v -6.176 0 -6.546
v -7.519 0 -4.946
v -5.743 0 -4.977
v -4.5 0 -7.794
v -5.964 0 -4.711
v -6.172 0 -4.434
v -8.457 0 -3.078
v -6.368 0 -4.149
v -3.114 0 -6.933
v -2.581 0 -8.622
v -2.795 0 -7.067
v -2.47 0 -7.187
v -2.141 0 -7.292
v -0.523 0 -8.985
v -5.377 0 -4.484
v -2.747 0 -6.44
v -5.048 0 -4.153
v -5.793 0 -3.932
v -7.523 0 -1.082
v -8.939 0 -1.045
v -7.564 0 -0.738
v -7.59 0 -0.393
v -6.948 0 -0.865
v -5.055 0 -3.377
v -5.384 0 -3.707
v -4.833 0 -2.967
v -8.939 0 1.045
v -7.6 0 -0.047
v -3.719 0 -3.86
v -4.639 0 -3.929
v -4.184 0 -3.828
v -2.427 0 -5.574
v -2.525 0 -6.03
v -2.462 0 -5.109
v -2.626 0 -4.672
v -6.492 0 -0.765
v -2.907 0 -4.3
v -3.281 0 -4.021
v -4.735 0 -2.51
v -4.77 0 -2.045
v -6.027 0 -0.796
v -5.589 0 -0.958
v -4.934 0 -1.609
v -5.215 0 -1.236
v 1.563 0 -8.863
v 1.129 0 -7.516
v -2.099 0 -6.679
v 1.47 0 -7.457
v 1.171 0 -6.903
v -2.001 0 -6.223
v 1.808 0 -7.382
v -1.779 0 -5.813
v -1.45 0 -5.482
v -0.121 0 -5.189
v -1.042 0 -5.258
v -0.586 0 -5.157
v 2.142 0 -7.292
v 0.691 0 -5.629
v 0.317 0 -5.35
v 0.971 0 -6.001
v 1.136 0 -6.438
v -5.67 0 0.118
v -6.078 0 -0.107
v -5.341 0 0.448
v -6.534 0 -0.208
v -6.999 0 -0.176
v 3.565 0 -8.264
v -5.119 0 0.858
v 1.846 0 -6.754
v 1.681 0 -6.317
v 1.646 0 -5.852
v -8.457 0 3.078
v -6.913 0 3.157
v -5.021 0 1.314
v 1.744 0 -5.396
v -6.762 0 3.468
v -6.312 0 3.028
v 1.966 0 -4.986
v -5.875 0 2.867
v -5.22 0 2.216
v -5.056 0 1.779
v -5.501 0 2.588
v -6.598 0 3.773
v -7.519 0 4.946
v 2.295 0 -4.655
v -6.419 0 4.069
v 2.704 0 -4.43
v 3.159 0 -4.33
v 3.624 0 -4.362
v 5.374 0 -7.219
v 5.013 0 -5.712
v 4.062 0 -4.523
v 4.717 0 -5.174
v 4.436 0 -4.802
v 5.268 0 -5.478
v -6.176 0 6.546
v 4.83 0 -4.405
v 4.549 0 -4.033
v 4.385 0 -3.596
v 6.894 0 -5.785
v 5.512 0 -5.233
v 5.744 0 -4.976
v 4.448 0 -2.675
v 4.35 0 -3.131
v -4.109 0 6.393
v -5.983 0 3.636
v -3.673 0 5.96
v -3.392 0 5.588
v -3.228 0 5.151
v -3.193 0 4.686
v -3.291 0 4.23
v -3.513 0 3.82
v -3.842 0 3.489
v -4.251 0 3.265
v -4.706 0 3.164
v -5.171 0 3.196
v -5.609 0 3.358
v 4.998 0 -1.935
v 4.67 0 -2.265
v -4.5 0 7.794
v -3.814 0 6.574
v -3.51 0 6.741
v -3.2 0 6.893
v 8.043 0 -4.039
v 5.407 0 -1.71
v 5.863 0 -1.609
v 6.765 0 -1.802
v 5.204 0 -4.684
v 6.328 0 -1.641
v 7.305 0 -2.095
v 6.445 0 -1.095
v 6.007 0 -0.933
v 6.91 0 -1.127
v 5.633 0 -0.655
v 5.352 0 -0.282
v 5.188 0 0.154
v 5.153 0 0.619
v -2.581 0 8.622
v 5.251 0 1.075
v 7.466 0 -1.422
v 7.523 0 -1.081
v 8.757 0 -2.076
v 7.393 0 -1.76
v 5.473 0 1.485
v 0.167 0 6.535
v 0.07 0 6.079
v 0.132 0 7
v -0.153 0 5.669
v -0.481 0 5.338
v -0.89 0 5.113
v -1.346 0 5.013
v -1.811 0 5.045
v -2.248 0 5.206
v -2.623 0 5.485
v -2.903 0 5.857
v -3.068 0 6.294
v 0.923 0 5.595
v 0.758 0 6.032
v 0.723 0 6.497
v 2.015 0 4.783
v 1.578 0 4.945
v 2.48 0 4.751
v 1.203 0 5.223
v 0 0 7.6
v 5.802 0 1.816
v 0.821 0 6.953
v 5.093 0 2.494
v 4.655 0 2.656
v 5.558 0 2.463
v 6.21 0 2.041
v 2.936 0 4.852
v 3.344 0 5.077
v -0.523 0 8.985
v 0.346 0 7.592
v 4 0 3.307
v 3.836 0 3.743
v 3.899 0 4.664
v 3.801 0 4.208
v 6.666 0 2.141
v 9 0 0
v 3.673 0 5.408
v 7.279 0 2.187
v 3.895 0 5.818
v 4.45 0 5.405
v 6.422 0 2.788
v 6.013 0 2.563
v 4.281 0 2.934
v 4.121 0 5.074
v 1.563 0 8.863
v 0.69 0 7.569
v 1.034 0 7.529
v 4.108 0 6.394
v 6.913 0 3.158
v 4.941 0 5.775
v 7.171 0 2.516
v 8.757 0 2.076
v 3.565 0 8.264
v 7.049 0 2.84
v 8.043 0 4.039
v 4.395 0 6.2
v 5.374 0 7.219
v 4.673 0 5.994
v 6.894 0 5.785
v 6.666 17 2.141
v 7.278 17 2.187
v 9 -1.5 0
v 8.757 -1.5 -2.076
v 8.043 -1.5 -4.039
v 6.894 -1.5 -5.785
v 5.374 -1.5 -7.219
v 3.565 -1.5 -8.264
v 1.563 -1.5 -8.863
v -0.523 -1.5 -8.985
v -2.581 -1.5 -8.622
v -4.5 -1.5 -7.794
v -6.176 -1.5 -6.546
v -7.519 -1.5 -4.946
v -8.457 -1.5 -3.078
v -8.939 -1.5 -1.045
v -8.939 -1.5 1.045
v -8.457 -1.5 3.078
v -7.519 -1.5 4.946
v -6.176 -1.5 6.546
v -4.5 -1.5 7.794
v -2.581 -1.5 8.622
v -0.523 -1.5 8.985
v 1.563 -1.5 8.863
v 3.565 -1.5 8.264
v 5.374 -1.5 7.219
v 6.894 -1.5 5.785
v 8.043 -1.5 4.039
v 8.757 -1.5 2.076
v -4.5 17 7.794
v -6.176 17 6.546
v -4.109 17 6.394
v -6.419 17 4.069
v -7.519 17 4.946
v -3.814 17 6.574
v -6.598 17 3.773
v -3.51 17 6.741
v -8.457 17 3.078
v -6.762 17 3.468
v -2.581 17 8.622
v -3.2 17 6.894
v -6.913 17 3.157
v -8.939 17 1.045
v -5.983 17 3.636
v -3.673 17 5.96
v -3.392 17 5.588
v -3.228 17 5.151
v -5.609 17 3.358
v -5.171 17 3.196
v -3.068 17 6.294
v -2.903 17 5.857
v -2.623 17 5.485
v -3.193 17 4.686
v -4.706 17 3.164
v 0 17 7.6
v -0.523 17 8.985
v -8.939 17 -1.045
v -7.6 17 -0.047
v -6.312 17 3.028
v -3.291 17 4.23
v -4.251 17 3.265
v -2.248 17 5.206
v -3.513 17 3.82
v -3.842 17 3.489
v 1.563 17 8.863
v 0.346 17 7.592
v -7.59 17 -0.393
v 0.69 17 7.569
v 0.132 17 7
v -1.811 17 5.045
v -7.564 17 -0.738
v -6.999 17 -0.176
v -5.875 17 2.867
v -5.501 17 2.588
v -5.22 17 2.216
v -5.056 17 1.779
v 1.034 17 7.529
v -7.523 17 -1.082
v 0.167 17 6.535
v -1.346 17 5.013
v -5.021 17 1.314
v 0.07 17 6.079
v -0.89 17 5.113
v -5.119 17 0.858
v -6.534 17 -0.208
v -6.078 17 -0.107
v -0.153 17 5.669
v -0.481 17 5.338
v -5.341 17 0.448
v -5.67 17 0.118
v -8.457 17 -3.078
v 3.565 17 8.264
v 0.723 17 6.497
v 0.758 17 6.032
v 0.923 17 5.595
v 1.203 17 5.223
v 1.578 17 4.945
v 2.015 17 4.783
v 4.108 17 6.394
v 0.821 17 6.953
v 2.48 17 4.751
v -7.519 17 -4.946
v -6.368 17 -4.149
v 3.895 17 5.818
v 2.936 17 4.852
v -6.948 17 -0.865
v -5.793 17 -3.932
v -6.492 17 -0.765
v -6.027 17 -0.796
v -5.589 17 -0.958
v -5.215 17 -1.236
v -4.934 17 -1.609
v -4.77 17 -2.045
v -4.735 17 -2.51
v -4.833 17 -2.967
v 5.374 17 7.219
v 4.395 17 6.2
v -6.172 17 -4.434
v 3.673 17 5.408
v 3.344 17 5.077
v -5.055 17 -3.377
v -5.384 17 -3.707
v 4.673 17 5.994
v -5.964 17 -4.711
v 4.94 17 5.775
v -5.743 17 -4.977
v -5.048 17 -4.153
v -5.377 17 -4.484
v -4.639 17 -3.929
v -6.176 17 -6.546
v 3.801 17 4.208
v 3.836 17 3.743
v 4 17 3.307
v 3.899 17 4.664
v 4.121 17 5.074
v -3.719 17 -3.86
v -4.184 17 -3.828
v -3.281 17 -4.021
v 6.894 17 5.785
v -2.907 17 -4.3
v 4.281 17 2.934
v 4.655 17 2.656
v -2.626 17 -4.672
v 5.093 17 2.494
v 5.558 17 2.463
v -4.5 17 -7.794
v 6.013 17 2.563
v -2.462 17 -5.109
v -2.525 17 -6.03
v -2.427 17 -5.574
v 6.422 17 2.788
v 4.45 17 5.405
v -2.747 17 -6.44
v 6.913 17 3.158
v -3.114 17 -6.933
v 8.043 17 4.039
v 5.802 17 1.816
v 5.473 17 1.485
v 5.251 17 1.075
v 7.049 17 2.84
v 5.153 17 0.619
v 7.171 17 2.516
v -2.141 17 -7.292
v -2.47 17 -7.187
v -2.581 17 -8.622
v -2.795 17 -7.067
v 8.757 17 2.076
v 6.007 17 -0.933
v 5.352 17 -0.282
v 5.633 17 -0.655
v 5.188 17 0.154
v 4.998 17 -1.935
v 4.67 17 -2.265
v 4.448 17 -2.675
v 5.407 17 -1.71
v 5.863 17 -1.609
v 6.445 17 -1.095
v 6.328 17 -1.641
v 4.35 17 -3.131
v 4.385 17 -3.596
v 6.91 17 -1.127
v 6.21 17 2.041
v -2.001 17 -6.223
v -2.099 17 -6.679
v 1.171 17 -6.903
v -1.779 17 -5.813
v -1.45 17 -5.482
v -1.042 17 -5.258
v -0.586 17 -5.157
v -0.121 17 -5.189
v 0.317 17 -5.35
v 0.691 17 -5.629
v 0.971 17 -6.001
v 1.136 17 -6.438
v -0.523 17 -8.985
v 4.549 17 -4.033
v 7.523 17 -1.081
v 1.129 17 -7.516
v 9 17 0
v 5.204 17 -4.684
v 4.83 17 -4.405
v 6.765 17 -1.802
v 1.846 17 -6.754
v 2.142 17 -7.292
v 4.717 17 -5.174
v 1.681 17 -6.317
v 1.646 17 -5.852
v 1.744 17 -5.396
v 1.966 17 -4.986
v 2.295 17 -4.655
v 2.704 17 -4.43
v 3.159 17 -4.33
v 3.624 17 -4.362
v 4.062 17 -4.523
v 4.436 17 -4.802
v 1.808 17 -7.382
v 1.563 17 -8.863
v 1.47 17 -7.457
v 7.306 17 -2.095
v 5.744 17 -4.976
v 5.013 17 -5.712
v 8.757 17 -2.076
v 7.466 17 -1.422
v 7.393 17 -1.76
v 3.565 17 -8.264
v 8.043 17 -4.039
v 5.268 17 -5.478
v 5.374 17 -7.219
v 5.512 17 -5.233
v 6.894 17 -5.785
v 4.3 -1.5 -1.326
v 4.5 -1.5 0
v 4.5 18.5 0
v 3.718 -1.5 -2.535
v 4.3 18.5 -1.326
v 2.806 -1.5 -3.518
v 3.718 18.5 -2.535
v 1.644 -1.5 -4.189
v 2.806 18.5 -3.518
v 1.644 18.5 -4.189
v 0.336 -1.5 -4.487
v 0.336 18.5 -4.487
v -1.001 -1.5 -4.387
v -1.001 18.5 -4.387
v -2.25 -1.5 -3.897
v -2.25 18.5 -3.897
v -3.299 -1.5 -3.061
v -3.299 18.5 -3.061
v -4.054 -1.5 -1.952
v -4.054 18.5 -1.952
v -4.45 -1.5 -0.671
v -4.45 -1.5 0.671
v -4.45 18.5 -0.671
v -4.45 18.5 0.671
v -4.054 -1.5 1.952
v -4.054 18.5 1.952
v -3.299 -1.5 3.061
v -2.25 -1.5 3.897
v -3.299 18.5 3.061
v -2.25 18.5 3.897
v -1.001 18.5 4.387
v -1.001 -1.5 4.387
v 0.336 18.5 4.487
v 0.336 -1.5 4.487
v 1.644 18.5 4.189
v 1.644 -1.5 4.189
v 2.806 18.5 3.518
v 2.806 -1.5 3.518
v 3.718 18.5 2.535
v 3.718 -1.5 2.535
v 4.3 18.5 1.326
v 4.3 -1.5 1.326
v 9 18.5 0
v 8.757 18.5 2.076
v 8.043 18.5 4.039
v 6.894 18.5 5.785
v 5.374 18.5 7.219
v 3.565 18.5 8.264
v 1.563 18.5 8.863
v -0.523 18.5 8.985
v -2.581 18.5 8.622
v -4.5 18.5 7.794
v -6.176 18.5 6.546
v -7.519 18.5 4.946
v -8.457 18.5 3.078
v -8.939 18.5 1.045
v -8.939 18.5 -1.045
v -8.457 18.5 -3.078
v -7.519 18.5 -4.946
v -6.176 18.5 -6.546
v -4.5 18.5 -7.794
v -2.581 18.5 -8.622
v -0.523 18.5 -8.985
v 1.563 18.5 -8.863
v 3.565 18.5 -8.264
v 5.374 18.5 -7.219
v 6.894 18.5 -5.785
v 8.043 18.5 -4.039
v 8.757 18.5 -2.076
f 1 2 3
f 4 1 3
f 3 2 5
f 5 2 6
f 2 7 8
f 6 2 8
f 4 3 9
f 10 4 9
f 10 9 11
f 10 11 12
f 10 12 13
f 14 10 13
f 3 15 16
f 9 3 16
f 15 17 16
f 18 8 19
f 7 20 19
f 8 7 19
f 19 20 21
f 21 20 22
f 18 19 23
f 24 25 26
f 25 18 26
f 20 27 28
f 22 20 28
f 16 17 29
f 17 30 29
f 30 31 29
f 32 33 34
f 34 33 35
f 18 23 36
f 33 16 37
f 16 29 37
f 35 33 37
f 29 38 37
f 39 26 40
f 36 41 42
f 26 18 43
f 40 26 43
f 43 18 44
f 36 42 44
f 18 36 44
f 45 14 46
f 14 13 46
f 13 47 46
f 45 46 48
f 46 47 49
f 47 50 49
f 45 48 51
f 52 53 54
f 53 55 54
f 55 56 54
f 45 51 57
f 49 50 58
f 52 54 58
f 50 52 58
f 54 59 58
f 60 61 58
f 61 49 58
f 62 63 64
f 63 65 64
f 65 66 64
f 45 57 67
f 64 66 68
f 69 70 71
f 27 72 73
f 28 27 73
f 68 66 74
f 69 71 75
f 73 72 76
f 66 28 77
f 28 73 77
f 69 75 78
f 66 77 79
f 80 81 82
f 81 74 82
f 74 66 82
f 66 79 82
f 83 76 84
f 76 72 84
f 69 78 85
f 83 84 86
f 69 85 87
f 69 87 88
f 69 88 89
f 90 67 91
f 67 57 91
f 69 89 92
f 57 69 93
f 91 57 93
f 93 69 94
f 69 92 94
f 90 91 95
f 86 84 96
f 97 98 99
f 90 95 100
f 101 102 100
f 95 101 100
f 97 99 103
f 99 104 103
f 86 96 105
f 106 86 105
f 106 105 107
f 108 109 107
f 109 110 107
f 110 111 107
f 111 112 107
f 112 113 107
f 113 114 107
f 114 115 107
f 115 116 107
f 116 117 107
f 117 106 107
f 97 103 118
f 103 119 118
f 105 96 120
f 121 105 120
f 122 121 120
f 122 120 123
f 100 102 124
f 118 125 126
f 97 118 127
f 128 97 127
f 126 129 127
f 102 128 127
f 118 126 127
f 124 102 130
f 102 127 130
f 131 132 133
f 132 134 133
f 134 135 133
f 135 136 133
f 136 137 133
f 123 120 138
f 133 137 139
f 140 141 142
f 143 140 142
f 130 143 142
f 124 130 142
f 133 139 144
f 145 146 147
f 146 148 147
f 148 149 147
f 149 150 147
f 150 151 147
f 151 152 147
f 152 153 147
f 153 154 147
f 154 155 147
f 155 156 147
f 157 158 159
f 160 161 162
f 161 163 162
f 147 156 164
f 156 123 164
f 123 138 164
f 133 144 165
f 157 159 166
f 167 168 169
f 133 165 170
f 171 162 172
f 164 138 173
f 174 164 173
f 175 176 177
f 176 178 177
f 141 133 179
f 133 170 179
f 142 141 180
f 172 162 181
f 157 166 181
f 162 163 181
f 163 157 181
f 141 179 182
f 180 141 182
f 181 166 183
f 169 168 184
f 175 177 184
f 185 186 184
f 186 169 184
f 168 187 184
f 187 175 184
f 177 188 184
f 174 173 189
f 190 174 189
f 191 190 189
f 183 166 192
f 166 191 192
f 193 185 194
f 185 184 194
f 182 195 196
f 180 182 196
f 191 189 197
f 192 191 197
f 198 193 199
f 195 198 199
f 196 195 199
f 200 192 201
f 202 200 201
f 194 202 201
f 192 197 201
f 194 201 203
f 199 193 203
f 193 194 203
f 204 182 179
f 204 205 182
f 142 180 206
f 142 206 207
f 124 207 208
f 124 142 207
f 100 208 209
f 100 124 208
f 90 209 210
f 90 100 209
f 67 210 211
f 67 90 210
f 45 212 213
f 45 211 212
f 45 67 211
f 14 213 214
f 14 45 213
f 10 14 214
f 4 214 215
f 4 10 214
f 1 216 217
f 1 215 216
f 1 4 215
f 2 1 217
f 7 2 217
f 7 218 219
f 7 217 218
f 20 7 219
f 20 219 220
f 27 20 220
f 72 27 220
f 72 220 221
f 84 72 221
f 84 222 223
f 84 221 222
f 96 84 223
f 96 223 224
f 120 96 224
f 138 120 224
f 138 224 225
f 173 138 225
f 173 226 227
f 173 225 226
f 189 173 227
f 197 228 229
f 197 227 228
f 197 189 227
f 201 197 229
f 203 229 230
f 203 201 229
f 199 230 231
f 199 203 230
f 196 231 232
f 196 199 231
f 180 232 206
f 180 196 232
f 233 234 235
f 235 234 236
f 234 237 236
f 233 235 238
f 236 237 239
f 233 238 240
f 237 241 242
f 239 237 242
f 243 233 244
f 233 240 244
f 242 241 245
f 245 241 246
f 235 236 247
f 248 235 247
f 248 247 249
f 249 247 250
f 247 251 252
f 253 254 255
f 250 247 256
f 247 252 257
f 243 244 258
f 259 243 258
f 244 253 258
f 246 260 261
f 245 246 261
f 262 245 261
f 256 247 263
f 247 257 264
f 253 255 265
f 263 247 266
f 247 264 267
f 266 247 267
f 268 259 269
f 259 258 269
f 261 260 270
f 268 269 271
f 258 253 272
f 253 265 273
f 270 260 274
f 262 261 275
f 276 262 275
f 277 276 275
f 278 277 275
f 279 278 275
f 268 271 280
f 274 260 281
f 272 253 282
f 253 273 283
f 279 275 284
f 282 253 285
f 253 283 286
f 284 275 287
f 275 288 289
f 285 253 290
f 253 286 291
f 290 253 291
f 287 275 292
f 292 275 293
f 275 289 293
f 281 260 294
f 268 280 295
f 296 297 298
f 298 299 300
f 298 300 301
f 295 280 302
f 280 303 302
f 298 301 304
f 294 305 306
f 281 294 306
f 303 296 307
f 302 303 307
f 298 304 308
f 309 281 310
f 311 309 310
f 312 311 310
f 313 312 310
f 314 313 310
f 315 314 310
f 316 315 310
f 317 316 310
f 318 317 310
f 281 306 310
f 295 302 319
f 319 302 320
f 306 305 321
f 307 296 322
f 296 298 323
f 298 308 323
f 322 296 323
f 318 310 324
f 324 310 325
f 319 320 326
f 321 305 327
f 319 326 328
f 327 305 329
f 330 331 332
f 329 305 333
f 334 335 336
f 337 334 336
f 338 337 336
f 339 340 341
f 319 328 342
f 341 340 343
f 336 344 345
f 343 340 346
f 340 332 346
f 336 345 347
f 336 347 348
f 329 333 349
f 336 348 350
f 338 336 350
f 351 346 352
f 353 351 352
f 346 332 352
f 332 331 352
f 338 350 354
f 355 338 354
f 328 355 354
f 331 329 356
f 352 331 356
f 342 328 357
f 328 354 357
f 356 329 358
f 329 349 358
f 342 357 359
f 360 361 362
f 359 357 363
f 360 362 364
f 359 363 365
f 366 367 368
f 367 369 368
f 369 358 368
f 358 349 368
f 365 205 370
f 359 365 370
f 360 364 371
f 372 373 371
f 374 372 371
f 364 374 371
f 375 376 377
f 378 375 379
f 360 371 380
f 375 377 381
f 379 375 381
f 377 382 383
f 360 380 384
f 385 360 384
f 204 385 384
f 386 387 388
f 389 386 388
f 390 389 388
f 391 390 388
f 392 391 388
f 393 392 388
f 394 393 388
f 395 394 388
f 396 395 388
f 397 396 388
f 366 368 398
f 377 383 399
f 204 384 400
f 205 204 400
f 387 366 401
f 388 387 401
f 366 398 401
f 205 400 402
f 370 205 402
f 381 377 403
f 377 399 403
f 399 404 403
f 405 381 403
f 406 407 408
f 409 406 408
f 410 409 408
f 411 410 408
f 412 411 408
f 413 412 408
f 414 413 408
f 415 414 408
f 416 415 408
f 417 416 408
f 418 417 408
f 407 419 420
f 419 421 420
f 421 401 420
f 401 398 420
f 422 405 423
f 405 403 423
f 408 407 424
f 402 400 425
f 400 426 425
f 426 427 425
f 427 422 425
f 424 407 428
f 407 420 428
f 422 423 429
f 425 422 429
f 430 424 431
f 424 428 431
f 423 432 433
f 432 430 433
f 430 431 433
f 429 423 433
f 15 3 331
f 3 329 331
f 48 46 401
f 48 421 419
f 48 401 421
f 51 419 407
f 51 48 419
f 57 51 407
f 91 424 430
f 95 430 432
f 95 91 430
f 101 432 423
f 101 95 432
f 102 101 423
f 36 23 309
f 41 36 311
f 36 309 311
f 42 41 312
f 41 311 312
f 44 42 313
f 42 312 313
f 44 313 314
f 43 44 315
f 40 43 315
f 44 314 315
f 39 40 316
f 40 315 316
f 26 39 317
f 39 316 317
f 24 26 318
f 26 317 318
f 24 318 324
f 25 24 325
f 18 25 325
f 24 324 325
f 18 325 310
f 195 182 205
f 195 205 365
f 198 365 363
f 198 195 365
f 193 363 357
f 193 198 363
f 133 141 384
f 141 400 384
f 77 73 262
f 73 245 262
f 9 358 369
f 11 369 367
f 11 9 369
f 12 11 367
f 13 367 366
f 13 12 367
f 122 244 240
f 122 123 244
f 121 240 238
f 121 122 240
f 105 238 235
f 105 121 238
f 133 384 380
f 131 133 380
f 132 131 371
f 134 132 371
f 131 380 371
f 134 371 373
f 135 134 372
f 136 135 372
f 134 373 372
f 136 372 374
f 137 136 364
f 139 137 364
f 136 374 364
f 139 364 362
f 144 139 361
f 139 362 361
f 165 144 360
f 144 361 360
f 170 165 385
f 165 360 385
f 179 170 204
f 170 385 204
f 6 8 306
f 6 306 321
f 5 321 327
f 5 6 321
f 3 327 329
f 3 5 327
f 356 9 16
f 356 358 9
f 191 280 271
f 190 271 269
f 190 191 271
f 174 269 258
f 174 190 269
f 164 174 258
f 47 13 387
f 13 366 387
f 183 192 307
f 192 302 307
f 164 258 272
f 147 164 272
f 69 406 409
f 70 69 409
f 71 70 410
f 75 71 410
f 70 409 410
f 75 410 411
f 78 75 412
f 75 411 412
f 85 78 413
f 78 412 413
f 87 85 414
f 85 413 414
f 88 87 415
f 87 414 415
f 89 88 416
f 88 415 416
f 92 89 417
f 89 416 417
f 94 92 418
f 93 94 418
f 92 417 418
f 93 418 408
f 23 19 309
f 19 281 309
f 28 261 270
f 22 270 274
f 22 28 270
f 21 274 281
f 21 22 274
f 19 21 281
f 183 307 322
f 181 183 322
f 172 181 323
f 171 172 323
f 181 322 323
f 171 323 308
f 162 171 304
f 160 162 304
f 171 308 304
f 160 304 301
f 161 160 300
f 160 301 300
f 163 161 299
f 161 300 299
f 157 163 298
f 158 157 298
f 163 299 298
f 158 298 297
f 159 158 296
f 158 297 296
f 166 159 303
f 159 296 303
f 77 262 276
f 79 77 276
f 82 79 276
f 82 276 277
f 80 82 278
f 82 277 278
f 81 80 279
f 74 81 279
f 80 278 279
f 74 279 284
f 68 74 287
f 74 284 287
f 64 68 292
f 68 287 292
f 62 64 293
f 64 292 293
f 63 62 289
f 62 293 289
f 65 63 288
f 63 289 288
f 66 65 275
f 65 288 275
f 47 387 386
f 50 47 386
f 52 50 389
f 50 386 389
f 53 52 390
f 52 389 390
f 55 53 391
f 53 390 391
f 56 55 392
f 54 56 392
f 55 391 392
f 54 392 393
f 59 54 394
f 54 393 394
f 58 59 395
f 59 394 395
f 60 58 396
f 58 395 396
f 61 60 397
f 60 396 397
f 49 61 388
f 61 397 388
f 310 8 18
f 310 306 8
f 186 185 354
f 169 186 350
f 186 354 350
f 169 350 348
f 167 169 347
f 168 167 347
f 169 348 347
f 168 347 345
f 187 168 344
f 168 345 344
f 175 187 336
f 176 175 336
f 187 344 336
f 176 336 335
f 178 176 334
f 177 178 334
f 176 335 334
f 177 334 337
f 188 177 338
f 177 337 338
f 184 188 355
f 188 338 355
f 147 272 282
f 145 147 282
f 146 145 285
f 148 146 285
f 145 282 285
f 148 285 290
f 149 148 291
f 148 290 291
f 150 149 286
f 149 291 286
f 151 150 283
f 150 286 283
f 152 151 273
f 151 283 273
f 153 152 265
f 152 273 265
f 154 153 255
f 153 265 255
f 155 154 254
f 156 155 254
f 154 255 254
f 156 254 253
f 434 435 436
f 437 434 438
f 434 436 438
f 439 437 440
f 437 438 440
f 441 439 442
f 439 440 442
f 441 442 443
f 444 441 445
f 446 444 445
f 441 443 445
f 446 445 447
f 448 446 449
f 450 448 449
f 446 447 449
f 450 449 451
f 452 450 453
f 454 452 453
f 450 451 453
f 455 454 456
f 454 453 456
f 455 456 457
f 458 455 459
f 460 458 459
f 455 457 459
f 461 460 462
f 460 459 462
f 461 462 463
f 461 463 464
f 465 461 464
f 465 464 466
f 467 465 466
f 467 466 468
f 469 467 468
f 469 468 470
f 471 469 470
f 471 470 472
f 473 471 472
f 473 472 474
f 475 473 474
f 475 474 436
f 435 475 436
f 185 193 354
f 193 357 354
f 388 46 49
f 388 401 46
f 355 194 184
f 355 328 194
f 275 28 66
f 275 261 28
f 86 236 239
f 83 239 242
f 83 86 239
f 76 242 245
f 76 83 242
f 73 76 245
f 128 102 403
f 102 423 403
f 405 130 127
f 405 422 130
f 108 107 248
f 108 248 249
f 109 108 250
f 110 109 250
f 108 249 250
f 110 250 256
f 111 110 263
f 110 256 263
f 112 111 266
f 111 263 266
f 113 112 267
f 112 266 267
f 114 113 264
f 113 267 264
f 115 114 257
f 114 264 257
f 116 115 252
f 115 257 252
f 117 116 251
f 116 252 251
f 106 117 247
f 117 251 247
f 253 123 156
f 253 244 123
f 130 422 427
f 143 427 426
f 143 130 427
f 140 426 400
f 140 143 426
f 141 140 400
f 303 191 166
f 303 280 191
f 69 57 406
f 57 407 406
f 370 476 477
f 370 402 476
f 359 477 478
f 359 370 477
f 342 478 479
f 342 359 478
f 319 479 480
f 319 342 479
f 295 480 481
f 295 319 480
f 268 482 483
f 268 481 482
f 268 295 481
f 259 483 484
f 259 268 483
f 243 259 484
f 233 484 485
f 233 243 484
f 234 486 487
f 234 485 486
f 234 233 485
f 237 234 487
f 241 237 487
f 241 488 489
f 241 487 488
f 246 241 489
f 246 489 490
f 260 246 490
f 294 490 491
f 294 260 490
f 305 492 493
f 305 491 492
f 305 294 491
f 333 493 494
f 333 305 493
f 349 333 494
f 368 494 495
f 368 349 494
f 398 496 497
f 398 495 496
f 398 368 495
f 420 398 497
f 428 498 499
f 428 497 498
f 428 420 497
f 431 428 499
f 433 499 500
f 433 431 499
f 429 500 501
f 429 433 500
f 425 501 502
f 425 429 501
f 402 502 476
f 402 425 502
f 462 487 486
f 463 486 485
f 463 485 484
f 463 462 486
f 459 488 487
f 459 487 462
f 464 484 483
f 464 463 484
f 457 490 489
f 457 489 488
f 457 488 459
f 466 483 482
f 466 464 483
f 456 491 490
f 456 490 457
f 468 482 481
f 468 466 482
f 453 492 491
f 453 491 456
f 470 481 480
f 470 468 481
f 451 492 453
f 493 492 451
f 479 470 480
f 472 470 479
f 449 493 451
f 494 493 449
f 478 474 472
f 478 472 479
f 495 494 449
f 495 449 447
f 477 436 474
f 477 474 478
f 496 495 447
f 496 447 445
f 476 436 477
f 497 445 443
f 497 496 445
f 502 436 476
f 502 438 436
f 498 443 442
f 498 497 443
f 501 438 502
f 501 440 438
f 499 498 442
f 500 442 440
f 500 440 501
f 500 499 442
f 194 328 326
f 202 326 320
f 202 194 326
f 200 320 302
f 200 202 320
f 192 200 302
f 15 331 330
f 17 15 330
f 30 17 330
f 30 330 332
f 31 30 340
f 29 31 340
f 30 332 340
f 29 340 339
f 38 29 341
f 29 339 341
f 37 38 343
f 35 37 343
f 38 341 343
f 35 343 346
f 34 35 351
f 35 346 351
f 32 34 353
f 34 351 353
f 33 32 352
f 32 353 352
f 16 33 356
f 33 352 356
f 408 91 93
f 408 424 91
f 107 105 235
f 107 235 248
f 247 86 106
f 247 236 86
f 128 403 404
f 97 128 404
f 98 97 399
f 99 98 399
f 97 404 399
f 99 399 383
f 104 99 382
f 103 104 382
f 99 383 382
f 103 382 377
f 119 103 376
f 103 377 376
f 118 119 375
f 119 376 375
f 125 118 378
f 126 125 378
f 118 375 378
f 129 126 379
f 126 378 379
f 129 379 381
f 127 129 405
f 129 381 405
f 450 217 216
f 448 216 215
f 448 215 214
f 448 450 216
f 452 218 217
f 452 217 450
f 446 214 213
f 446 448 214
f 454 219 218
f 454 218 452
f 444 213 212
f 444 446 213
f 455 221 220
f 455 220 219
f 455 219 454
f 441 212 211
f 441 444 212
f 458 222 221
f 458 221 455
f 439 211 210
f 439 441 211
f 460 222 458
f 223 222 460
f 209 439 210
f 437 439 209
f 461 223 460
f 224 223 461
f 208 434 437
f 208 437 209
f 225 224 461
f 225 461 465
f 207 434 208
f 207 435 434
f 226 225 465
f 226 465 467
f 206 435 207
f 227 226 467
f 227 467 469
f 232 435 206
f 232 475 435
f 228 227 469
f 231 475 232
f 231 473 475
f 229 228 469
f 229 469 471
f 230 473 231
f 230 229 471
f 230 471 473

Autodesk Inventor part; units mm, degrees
ref_plane "YZ Plane" through (0, 0, 0) normal (1, 0, 0) x (0, 1, 0)
ref_plane "XZ Plane" through (0, 0, 0) normal (0, 1, 0) x (-1, 0, 0)
ref_plane "XY Plane" through (0, 0, 0) normal (0, 0, 1) x (1, 0, 0)
sketch "Esquisse2" plane through (0, 0, 0) normal (0, 1, 0) x (-1, 0, 0)
  circle A0 centre (0, 0) radius 7.6
  dimension "d0" = 15.2
extrude "Extrusion1" add sketch "Esquisse2" along normal blind 17
sketch "Esquisse4" plane through (0, 17, 0) normal (0, 1, 0) x (1, 0, 0)
  circle A0 centre (0, 0) radius 7.6 projected
  circle A1 centre (0, 0) radius 7.6 projected
  arc A2 (-3.2, -6.8935) -> (0, -7.6) centre (0, 0) ccw
  line L0 (-0.0062, -0.0113) -> (-4.6214, -8.4012)
  line L1 (0, -6.3735) -> (0, 5.2233) construction
  line L2 (-3.2, -6.8935) -> (0, -7.6) construction
  line L3 (-3.2, -6.8935) -> (-3.0675, -6.2935)
  line L4 (0, -7.6) -> (0.1325, -7)
  arc A3 (0.1325, -7) -> (-3.0675, -6.2935) centre (-1.4675, -6.6467) ccw
  line L5 (-3.0675, -6.2935) -> (0.1325, -7) construction
  arc A4 (-6.419, -4.069) -> (-4.109, -6.3935) centre (0, 0) ccw
  line L6 (-4.109, -6.3935) -> (-6.419, -4.069) construction
  line L7 (-4.109, -6.3935) -> (-3.6731, -5.9603)
  line L8 (-6.419, -4.069) -> (-5.9831, -3.6359)
  arc A5 (-3.6731, -5.9603) -> (-5.9831, -3.6359) centre (-4.8281, -4.7981) ccw
  line L9 (-3.6731, -5.9603) -> (-5.9831, -3.6359) construction
  line L10 (-4.109, -6.3935) -> (-3.2, -6.8935) construction
  line L11 (0, 0) -> (-8.9658, -4.8594)
  arc A6 (-6.3677, 4.1487) -> (-7.5226, 1.0819) centre (0, 0) ccw
  line L12 (-7.5226, 1.0819) -> (-6.3677, 4.1487) construction
  line L13 (-7.5226, 1.0819) -> (-6.9476, 0.8653)
  line L14 (-6.3677, 4.1487) -> (-5.7927, 3.9322)
  arc A7 (-6.9476, 0.8653) -> (-5.7927, 3.9322) centre (-6.3701, 2.3988) ccw
  line L15 (-6.9476, 0.8653) -> (-5.7927, 3.9322) construction
  arc A8 (-7.5999, 0.0474) -> (-6.9133, -3.157) centre (0, 0) ccw
  line L16 (-7.5999, 0.0474) -> (-6.9133, -3.157) construction
  line L17 (-7.5999, 0.0474) -> (-6.999, 0.1761)
  line L18 (-6.9133, -3.157) -> (-6.3125, -3.0282)
  arc A9 (-6.3125, -3.0282) -> (-6.999, 0.1761) centre (-6.6558, -1.4261) ccw
  line L19 (-6.999, 0.1761) -> (-6.3125, -3.0282) construction
  line L20 (-7.5999, 0.0474) -> (-7.5226, 1.0819) construction
  line L21 (-6.9133, -3.157) -> (-6.419, -4.069) construction
  line L22 (0, 0) -> (-6.7758, 5.1057)
  arc A10 (7.3055, 2.0952) -> (5.7441, 4.9764) centre (0, 0) ccw
  line L23 (5.7441, 4.9764) -> (7.3055, 2.0952) construction
  line L24 (5.7441, 4.9764) -> (5.2039, 4.6837)
  line L25 (7.3055, 2.0952) -> (6.7653, 1.8025)
  arc A11 (5.2039, 4.6837) -> (6.7653, 1.8025) centre (5.9846, 3.2431) ccw
  line L26 (5.2039, 4.6837) -> (6.7653, 1.8025) construction
  arc A12 (5.0129, 5.7123) -> (2.1417, 7.292) centre (0, 0) ccw
  line L27 (5.0129, 5.7123) -> (2.1417, 7.292) construction
  line L28 (5.0129, 5.7123) -> (4.7167, 5.174)
  line L29 (2.1417, 7.292) -> (1.8455, 6.7536)
  arc A13 (1.8455, 6.7536) -> (4.7167, 5.174) centre (3.2811, 5.9638) ccw
  line L30 (4.7167, 5.174) -> (1.8455, 6.7536) construction
  line L31 (5.0129, 5.7123) -> (5.7441, 4.9764) construction
  line L32 (-3.1138, 6.9328) -> (-2.7472, 6.4398)
  arc A14 (-5.3768, 4.4842) -> (-2.7472, 6.4398) centre (-4.062, 5.462) ccw
  line L33 (-2.7472, 6.4398) -> (-5.3768, 4.4842) construction
  line L34 (-3.1138, 6.9328) -> (-5.7434, 4.9772) construction
  arc A15 (-3.1138, 6.9328) -> (-5.7434, 4.9772) centre (0, 0) ccw
  line L35 (-5.7434, 4.9772) -> (-5.3768, 4.4842)
  line L36 (-2.1407, 7.2923) -> (-3.1138, 6.9328) construction
  line L37 (-2.1407, 7.2923) -> (-2.0988, 6.6793)
  line L38 (-2.0988, 6.6793) -> (1.1706, 6.9027) construction
  line L39 (-2.1407, 7.2923) -> (1.1287, 7.5157) construction
  arc A16 (1.1287, 7.5157) -> (-2.1407, 7.2923) centre (0, 0) ccw
  arc A17 (-2.0988, 6.6793) -> (1.1706, 6.9027) centre (-0.4641, 6.791) ccw
  line L40 (1.1287, 7.5157) -> (1.1706, 6.9027)
  line L41 (1.1287, 7.5157) -> (2.1417, 7.292) construction
  line L42 (-6.3677, 4.1487) -> (-5.7434, 4.9772) construction
  line L43 (0, 0) -> (10.678, -14.3583) construction
  arc A18 (7.2785, -2.1871) -> (7.5228, 1.0808) centre (0, 0) ccw
  line L44 (7.5228, 1.0808) -> (7.2785, -2.1871) construction
  line L45 (7.5228, 1.0808) -> (6.91, 1.1266)
  line L46 (7.2785, -2.1871) -> (6.6658, -2.1413)
  arc A19 (6.91, 1.1266) -> (6.6658, -2.1413) centre (6.7879, -0.5073) ccw
  line L47 (6.91, 1.1266) -> (6.6658, -2.1413) construction
  line L48 (7.3055, 2.0952) -> (7.5228, 1.0808) construction
  line L49 (7.2785, -2.1871) -> (0, -7.6) construction
  line L50 (0, 0) -> (10.2791, -3.8716)
  line L51 (1.0339, -7.5293) -> (0.8211, -6.9529)
  arc A20 (3.8952, -5.8176) -> (0.8211, -6.9529) centre (2.3581, -6.3853) ccw
  arc A21 (1.0339, -7.5293) -> (4.1081, -6.394) centre (0, 0) ccw
  line L52 (4.1081, -6.394) -> (3.8952, -5.8176)
  line L53 (0.8211, -6.9529) -> (3.8952, -5.8176) construction
  line L54 (4.9405, -5.775) -> (4.4498, -5.4052)
  arc A22 (6.4221, -2.7881) -> (4.4498, -5.4052) centre (5.436, -4.0967) ccw
  line L55 (4.4498, -5.4052) -> (6.4221, -2.7881) construction
  line L56 (4.9405, -5.775) -> (6.9128, -3.1579) construction
  arc A23 (4.9405, -5.775) -> (6.9128, -3.1579) centre (0, 0) ccw
  line L57 (6.9128, -3.1579) -> (6.4221, -2.7881)
  line L58 (7.2785, -2.1871) -> (6.9128, -3.1579) construction
  point P0 (-7.5999, 0.0474)
  point P1 (-6.9133, -3.157)
  point P2 (-6.3677, 4.1487)
  point P3 (-7.5226, 1.0819)
  point P4 (-3.1138, 6.9328)
  point P5 (-5.7434, 4.9772)
  point P6 (1.1287, 7.5157)
  point P7 (-2.1407, 7.2923)
  point P8 (5.0129, 5.7123)
  point P9 (2.1417, 7.292)
  point P10 (7.3055, 2.0952)
  point P11 (5.7441, 4.9764)
  point P12 (-3.2, -6.8935)
  point P13 (0, -7.6)
  point P14 (-6.419, -4.069)
  point P15 (-4.109, -6.3935)
  point P16 (7.2785, -2.1871)
  point P17 (7.5228, 1.0808)
  point P18 (4.9405, -5.775)
  point P19 (4.9405, -5.775)
  point P20 (6.9128, -3.1579)
  point P21 (1.0339, -7.5293)
  point P22 (4.1081, -6.394)
  dimension "d14" = 3.2
  dimension "d28" = 0.6
  dimension "d30" = 0.5
extrude "Extrusion6" cut sketch "Esquisse4" against normal through all contours A0 L46 A19 L45 | L25 A11 L24 A0 | A0 L54 A22 L57 | L28 A13 L29 A0 | A0 L51 A20 L52 | A0 L17 A9 L18 | L8 A5 L7 A0 | A0 L32 A14 L35 | L14 A7 L13 A0 | L40 A17 L37 A0 | A0 L3 A3 L4
sketch "Esquisse6" plane through (0, 17, 0) normal (0, 1, 0) x (1, 0, 0)
  circle A0 centre (0, 0) radius 9
  dimension "d19" = 18
extrude "Extrusion3" add sketch "Esquisse6" along normal blind 1.5
sketch "Esquisse7" plane through (0, 0, 0) normal (0, -1, 0) x (1, 0, 0)
  circle A0 centre (0, 0) radius 9
  dimension "d34" = 18
extrude "Extrusion4" add sketch "Esquisse7" along normal blind 1.5
sketch "Esquisse8" plane through (0, 18.5, 0) normal (0, 1, 0) x (1, 0, 0)
  circle A0 centre (0, 0) radius 4.5
  dimension "d24" = 9
extrude "Extrusion5" cut sketch "Esquisse8" against normal through all
properties part number "Pièce_moteur_courroie_test_6"
